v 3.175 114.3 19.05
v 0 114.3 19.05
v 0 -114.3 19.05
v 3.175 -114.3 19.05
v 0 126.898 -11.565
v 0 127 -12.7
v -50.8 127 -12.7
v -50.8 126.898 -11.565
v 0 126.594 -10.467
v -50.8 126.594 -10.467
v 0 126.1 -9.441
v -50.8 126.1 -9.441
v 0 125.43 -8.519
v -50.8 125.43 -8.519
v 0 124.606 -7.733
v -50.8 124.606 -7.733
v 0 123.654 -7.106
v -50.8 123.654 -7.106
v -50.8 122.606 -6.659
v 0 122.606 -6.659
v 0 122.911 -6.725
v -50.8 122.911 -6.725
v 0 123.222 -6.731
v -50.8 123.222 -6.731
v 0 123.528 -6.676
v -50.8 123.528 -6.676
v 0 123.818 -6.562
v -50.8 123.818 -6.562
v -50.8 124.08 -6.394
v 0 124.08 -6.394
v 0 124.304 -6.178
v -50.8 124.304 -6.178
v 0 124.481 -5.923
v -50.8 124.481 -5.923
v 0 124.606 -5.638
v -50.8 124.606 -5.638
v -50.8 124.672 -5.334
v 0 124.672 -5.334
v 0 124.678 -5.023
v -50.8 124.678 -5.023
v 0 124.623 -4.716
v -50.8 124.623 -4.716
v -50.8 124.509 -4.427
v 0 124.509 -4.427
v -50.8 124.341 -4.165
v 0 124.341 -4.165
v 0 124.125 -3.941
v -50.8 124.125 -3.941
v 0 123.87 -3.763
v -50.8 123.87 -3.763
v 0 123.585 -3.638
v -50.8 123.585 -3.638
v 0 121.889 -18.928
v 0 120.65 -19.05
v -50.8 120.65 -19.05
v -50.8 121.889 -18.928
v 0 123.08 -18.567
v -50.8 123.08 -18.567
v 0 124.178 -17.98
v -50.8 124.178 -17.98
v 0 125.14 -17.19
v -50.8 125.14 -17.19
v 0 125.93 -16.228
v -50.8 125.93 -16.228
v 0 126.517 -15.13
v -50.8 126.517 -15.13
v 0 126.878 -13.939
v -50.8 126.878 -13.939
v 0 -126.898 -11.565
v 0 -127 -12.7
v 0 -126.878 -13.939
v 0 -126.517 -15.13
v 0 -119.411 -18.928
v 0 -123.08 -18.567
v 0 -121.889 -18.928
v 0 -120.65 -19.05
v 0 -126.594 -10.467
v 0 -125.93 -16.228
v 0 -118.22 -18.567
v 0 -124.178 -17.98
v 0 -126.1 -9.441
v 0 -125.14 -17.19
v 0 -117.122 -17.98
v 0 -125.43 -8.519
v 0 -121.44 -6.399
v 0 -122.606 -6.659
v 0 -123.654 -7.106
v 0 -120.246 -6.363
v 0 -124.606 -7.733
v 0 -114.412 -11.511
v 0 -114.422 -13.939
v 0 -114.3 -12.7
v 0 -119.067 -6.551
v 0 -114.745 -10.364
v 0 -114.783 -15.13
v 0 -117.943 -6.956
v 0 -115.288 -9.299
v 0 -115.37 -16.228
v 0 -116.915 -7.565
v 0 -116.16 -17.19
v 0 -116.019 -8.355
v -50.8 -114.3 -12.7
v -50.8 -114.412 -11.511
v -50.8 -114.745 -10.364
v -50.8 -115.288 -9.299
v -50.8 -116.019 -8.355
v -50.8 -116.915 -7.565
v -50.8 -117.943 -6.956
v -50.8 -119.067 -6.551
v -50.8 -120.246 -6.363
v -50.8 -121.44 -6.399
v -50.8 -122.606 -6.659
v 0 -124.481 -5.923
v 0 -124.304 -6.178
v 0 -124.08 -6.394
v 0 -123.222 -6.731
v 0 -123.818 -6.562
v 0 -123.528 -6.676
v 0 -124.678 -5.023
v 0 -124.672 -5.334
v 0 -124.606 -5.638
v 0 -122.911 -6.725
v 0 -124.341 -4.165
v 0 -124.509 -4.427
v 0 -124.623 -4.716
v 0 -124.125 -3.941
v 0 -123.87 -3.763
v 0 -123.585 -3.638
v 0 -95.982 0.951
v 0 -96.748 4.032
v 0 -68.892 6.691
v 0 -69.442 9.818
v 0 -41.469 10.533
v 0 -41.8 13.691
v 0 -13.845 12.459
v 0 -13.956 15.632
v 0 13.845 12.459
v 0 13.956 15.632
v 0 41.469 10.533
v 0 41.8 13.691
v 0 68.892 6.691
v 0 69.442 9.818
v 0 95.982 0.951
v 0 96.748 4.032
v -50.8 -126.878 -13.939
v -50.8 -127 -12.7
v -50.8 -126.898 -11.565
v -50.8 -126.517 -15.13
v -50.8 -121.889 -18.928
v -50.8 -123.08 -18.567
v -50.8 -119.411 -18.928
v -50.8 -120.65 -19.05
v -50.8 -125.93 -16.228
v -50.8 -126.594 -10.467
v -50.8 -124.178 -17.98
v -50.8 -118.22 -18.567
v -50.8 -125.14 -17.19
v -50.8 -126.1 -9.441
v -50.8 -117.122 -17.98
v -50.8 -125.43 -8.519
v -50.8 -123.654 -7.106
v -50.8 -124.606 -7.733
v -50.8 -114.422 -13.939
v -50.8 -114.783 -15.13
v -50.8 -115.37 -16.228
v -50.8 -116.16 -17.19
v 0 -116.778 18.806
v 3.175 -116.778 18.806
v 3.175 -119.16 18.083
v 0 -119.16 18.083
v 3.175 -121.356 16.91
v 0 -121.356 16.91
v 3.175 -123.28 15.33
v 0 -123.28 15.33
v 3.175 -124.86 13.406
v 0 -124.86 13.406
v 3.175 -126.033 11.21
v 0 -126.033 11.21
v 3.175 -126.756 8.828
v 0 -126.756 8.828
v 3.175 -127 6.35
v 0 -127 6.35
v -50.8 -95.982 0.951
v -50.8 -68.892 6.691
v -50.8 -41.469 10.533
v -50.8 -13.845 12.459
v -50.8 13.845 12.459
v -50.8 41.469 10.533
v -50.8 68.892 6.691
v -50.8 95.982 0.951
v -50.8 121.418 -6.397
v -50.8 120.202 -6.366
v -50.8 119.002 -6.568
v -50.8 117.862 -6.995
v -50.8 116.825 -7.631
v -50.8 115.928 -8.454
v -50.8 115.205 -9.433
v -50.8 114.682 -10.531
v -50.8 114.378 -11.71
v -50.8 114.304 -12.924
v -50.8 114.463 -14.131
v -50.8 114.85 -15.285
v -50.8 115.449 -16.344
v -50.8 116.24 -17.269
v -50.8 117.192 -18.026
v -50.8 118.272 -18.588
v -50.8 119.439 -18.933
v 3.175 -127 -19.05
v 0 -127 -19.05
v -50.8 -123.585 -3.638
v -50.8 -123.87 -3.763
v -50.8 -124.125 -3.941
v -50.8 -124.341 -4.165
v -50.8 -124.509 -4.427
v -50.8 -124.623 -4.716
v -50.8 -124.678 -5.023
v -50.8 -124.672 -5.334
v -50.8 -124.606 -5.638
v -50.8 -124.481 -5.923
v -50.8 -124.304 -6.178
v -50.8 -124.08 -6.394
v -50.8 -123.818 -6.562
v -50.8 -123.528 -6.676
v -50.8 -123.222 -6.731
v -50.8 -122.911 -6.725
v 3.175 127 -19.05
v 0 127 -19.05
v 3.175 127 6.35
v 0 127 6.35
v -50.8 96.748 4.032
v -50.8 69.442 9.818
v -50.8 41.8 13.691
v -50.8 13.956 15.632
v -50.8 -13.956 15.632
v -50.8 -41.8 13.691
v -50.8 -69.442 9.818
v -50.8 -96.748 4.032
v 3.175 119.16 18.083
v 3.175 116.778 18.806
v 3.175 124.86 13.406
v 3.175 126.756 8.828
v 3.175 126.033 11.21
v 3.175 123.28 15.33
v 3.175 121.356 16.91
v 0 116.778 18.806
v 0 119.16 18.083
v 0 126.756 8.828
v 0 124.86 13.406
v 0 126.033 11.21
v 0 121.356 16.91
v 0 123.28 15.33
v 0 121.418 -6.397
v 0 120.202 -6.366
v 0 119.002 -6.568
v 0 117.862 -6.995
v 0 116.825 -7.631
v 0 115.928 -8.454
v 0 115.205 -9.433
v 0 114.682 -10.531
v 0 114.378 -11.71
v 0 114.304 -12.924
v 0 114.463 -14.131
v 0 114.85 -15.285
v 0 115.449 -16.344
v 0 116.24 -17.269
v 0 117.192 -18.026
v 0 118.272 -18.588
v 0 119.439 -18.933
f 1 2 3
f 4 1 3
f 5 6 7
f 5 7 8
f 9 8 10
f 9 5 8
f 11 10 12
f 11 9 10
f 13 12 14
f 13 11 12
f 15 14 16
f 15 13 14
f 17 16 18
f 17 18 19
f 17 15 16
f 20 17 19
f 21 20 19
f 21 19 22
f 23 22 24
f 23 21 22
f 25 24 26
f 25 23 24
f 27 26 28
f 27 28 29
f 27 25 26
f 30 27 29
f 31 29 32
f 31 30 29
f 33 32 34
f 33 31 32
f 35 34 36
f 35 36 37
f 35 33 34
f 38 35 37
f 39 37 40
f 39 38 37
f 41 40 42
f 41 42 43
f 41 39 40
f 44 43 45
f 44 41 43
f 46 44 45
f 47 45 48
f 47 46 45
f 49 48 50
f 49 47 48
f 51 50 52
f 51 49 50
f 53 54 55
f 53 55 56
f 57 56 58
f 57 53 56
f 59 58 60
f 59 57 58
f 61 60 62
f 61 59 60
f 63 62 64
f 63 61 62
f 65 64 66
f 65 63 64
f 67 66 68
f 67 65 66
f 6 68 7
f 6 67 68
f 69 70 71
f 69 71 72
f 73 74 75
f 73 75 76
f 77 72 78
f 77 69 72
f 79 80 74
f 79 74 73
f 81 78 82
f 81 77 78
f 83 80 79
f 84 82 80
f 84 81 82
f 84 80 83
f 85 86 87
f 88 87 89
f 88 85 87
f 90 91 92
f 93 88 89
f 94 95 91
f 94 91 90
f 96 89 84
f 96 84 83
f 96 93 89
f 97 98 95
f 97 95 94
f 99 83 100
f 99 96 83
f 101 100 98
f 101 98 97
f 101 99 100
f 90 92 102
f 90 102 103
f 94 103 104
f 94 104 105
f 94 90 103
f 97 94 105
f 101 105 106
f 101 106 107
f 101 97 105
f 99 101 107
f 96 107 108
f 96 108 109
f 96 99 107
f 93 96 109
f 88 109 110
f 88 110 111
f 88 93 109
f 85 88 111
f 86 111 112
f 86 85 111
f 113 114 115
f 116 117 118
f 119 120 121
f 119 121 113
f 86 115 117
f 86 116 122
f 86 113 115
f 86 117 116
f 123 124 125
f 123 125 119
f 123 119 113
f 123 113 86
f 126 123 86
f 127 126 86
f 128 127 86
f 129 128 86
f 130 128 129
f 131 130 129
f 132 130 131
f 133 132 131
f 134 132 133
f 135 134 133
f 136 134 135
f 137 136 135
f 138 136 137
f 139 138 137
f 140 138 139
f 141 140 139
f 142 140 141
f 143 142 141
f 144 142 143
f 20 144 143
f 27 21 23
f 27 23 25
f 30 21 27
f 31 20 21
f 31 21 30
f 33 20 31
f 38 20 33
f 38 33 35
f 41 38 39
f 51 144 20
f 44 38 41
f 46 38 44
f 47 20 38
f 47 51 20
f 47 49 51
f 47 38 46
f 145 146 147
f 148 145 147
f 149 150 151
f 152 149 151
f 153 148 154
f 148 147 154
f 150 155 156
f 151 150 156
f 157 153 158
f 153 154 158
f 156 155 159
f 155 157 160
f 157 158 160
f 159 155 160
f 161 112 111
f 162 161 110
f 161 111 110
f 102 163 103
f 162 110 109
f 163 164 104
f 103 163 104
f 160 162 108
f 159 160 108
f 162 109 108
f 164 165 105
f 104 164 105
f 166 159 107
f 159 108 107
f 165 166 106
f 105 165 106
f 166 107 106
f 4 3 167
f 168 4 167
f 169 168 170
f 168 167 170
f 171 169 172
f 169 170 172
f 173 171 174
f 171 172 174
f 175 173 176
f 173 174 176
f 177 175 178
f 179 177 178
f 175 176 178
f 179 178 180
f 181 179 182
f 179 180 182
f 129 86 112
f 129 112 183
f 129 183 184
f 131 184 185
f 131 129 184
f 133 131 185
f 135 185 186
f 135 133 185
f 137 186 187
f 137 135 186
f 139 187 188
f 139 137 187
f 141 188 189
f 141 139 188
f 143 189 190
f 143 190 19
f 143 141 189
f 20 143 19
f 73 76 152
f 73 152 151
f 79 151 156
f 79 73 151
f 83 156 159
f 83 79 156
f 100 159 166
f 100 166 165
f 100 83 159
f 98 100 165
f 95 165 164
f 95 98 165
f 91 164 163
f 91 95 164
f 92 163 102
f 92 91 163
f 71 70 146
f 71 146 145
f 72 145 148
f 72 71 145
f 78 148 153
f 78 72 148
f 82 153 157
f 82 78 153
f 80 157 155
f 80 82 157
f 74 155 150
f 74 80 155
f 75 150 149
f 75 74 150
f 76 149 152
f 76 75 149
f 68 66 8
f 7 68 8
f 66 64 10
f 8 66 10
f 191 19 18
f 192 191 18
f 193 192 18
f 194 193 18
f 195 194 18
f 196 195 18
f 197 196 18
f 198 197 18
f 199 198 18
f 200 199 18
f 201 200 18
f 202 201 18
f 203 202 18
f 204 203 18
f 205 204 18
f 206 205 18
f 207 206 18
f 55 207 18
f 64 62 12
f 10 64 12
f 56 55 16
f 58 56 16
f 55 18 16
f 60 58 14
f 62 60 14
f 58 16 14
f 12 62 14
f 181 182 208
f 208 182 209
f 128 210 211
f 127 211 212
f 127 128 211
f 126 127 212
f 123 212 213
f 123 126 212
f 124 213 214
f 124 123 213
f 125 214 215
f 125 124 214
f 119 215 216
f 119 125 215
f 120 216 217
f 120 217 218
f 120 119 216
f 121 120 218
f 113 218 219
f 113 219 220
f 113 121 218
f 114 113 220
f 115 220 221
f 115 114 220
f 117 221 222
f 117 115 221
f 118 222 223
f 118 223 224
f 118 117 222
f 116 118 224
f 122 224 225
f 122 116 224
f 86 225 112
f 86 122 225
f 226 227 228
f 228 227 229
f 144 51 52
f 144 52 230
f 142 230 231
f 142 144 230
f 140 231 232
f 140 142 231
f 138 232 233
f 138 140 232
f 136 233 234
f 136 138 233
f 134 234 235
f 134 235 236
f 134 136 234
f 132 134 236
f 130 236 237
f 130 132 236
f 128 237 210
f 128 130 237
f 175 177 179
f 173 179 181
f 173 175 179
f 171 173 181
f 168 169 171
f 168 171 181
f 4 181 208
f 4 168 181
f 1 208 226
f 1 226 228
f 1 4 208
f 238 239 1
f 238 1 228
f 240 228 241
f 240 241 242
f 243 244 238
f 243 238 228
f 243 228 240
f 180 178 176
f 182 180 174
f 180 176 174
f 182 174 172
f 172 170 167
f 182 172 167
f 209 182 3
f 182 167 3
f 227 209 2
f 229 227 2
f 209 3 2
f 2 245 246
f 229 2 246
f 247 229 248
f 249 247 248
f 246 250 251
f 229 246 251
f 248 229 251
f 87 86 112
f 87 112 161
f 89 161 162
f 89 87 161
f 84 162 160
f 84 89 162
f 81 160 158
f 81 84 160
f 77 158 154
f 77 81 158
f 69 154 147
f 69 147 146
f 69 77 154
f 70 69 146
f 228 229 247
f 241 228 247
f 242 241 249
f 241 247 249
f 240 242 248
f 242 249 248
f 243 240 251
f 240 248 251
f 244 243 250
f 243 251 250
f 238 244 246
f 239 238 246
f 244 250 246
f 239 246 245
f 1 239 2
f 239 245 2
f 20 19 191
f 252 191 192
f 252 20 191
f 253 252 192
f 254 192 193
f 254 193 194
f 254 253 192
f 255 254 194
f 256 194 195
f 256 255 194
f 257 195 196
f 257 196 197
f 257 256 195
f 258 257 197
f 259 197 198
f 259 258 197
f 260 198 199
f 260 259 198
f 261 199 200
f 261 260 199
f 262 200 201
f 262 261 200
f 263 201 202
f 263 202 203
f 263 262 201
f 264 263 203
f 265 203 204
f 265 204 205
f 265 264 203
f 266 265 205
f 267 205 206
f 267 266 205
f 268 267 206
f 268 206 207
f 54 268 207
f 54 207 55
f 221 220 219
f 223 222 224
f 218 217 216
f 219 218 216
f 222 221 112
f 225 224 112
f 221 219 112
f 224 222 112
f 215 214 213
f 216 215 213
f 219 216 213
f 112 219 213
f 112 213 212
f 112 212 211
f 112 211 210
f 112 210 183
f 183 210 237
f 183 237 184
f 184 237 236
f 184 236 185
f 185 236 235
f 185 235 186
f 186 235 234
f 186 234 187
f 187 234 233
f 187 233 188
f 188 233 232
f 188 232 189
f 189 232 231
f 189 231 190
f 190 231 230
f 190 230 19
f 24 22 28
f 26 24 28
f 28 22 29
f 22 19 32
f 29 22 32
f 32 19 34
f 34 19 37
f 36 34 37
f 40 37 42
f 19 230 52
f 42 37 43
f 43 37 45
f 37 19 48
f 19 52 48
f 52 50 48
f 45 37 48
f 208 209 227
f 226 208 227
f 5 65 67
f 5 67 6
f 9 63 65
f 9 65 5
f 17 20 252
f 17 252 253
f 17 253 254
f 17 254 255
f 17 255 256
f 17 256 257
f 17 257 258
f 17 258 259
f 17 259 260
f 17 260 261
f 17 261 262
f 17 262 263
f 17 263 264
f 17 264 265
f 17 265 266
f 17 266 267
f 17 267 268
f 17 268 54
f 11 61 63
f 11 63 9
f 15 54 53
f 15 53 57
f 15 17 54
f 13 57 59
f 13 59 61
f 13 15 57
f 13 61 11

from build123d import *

# Parameters (mm, degrees)
F1_DEPTH = 3.175
F2_DEPTH = 50.8
F3_DEPTH = 50.8


with BuildPart() as f1:
    # F0 (on Right) → F1 (new body)
    with BuildSketch(Plane.YZ):
        with BuildLine():
            ThreePointArc((122.606486, -6.658919), (0, 12.7), (-122.606486, -6.658919))
            ThreePointArc((-122.606486, -6.658919), (-116.91511, -7.564526), (-114.3, -12.7))
            ThreePointArc((-114.3, -12.7), (-116.159872, -17.190128), (-120.65, -19.05))
            Line((-120.65, -19.05), (120.65, -19.05))
            ThreePointArc((120.65, -19.05), (114.377705, -11.709638), (122.606486, -6.658919))
        make_face()
        with BuildLine():
            ThreePointArc((-123.584728, -3.638378), (-124.605877, -5.637769), (-122.606486, -6.658919))
            ThreePointArc((-122.606486, -6.658919), (0, 12.7), (122.606486, -6.658919))
            ThreePointArc((122.606486, -6.658919), (124.60588, -5.637773), (123.584734, -3.63838))
            ThreePointArc((123.584734, -3.63838), (3e-06, 15.875), (-123.584728, -3.638378))
        make_face()
        with BuildLine():
            ThreePointArc((-120.65, -19.05), (-125.140128, -17.190128), (-127, -12.7))
            Line((-127, -12.7), (-127, -19.05))
            Line((-127, -19.05), (-120.65, -19.05))
        make_face()
        with BuildLine():
            Line((114.3, 19.05), (-114.3, 19.05))
            ThreePointArc((-114.3, 19.05), (-123.280256, 15.330256), (-127, 6.35))
            Line((-127, 6.35), (-127, -12.7))
            ThreePointArc((-127, -12.7), (-125.785474, -8.96511), (-122.606486, -6.658919))
            ThreePointArc((-122.606486, -6.658919), (-124.605877, -5.637769), (-123.584728, -3.638378))
            ThreePointArc((-123.584728, -3.638378), (3e-06, 15.875), (123.584734, -3.63838))
            ThreePointArc((123.584734, -3.63838), (124.60588, -5.637773), (122.606486, -6.658919))
            ThreePointArc((122.606486, -6.658919), (125.785474, -8.96511), (127, -12.7))
            Line((127, -12.7), (127, 6.35))
            ThreePointArc((127, 6.35), (123.280256, 15.330256), (114.3, 19.05))
        make_face()
        with BuildLine():
            Line((127, -19.05), (127, -12.7))
            ThreePointArc((127, -12.7), (125.140128, -17.190128), (120.65, -19.05))
            Line((120.65, -19.05), (127, -19.05))
        make_face()
        with BuildLine():
            ThreePointArc((-122.606486, -6.658919), (-125.785474, -8.96511), (-127, -12.7))
            ThreePointArc((-127, -12.7), (-125.140128, -17.190128), (-120.65, -19.05))
            ThreePointArc((-120.65, -19.05), (-116.159872, -17.190128), (-114.3, -12.7))
            ThreePointArc((-114.3, -12.7), (-116.91511, -7.564526), (-122.606486, -6.658919))
        make_face()
        with BuildLine():
            ThreePointArc((120.65, -19.05), (125.140128, -17.190128), (127, -12.7))
            ThreePointArc((127, -12.7), (125.785474, -8.96511), (122.606486, -6.658919))
            ThreePointArc((122.606486, -6.658919), (114.377705, -11.709638), (120.65, -19.05))
        make_face()
    extrude(amount=F1_DEPTH)


with BuildPart() as f2:
    # F0 (on Right) → F2 (new body)
    with BuildSketch(Plane.YZ):
        with BuildLine():
            ThreePointArc((-122.606486, -6.658919), (-125.785474, -8.96511), (-127, -12.7))
            ThreePointArc((-127, -12.7), (-125.140128, -17.190128), (-120.65, -19.05))
            ThreePointArc((-120.65, -19.05), (-116.159872, -17.190128), (-114.3, -12.7))
            ThreePointArc((-114.3, -12.7), (-116.91511, -7.564526), (-122.606486, -6.658919))
        make_face()
        with BuildLine():
            ThreePointArc((120.65, -19.05), (125.140128, -17.190128), (127, -12.7))
            ThreePointArc((127, -12.7), (125.785474, -8.96511), (122.606486, -6.658919))
            ThreePointArc((122.606486, -6.658919), (114.377705, -11.709638), (120.65, -19.05))
        make_face()
    extrude(amount=-F2_DEPTH)


with BuildPart() as f3:
    # F0 (on Right) → F3 (new body, through all)
    with BuildSketch(Plane.YZ):
        with BuildLine():
            ThreePointArc((-123.584728, -3.638378), (-124.605877, -5.637769), (-122.606486, -6.658919))
            ThreePointArc((-122.606486, -6.658919), (0, 12.7), (122.606486, -6.658919))
            ThreePointArc((122.606486, -6.658919), (124.60588, -5.637773), (123.584734, -3.63838))
            ThreePointArc((123.584734, -3.63838), (3e-06, 15.875), (-123.584728, -3.638378))
        make_face()
    extrude(amount=-F3_DEPTH)


solid = Compound([f1.part, f2.part, f3.part])
